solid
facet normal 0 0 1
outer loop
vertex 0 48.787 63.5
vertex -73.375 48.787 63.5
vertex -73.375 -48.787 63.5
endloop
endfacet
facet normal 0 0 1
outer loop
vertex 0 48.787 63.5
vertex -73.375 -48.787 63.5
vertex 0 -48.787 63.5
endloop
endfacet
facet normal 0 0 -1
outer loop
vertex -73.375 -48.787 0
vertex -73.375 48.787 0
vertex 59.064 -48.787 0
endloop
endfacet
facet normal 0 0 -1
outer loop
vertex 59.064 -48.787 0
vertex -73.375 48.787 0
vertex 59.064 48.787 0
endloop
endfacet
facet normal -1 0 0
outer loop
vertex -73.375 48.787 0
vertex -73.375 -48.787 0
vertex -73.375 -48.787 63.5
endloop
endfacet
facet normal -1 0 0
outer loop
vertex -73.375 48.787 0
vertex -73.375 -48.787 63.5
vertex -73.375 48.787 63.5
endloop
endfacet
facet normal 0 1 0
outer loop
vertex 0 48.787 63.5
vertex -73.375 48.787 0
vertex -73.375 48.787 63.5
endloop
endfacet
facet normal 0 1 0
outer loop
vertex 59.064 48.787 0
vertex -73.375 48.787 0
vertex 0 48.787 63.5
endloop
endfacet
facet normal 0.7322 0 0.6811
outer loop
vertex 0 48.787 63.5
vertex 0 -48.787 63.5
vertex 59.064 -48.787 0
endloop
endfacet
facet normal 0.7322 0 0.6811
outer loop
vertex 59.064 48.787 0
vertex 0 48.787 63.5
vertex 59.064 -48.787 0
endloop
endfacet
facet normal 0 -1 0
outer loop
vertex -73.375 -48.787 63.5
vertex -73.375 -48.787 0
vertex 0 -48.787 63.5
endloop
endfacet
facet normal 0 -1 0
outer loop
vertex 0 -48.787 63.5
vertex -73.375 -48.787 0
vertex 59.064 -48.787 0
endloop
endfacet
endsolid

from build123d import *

# Parameters (mm, degrees)
F0_W     = 146.750048
F0_H     = 97.573176
F1_DEPTH = 63.5
F3_DEPTH = 97.574176
F5_DEPTH = 97.574176


with BuildPart() as f1:
    # F0 (on Top) → F1 (new body)
    with BuildSketch(Plane.XY):
        Rectangle(F0_W, F0_H)
    extrude(amount=F1_DEPTH)

    # F2 (on face) → F3 (cut, through all)
    with BuildSketch(Plane.XZ.offset(48.786588)):
        Polygon((73.375024, 63.5), (0, 63.5), (73.375024, 0), align=None)
    extrude(amount=-F3_DEPTH, mode=Mode.SUBTRACT)

    # F4 (on face) → F5 (cut, through all)
    with BuildSketch(Plane.XZ.offset(48.786588)):
        Polygon((0, 63.5), (59.064299, 0), (73.375024, 0), align=None)
    extrude(amount=-F5_DEPTH, mode=Mode.SUBTRACT)


solid = f1.part
